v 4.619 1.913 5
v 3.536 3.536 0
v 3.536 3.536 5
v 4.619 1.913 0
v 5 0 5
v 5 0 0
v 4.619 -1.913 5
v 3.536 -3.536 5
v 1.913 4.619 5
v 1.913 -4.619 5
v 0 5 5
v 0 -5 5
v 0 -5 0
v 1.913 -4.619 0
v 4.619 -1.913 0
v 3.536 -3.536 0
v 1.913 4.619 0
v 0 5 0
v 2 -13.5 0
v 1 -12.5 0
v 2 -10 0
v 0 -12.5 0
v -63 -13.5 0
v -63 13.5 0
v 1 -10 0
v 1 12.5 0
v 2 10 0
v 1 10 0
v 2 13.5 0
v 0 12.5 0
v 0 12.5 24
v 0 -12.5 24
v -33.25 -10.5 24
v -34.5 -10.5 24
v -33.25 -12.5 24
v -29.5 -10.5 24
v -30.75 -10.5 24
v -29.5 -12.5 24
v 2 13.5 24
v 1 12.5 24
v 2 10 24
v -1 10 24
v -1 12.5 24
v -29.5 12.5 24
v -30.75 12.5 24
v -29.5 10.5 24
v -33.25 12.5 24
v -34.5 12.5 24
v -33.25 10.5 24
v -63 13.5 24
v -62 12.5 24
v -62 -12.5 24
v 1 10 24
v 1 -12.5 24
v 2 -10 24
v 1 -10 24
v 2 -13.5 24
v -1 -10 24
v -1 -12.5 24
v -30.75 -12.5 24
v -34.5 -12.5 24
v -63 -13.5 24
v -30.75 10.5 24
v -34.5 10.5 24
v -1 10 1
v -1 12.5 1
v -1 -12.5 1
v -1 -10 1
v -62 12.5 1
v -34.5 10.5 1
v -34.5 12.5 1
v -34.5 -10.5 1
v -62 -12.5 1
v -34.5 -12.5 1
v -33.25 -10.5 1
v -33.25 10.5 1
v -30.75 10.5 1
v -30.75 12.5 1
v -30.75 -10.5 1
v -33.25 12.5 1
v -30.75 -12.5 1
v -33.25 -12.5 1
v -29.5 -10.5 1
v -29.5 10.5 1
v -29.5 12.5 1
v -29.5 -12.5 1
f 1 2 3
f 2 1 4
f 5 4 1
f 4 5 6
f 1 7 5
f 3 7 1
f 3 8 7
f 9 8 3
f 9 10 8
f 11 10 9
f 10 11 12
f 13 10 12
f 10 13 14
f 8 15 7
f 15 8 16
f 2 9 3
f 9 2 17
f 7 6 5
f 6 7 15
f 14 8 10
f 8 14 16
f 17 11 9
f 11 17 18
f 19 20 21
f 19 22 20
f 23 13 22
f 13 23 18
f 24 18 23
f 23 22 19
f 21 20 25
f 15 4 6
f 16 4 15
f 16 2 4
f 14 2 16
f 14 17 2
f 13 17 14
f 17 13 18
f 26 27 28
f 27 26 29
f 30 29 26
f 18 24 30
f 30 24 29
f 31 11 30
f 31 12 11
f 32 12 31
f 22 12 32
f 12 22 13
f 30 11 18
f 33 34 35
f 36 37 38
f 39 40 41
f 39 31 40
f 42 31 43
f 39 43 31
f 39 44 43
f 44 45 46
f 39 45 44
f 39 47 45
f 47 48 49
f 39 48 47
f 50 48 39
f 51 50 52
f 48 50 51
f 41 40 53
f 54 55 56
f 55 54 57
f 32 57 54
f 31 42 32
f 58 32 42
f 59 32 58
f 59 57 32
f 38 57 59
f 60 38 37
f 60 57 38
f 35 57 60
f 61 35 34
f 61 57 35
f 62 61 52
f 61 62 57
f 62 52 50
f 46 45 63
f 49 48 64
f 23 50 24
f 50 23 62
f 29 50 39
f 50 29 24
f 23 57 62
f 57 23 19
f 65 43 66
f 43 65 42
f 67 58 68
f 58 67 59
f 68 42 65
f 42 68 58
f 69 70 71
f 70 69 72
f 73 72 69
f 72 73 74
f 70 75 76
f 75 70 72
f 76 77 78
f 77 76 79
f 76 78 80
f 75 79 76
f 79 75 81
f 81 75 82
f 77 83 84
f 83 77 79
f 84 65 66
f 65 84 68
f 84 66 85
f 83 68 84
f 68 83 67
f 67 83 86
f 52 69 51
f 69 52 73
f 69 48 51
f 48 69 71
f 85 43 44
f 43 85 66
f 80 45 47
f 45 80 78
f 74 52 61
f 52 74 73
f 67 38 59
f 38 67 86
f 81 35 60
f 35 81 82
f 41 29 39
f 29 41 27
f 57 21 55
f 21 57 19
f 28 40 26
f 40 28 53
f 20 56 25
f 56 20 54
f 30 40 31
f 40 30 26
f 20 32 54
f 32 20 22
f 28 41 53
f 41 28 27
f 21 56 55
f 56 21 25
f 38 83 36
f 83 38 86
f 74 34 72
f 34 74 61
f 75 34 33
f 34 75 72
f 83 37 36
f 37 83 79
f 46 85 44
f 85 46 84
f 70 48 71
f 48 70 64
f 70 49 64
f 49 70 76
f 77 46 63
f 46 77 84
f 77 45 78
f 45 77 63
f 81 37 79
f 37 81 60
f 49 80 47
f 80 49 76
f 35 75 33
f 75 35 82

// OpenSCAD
// [FL_INDEX: keywords="openscad, 3d_parametric, Customizable_Mini_Storage_Drawers_V1_7__Updated_23_07_2015, csg_solid" | COT="Parametric OpenSCAD design from 3DCodeverse"]
// Title: Customizable Mini Storage Drawers V1.7 *Updated 23/07/2015*

//Box type 
box_type = 1; //[0:Half Height, 1:Standard, 2:Double, 3:Quad]

//Rack depth (no more than your max Z height!)
depth = 64;

//With divider slots?
divider = 1; //[0:No, 1:Yes]

//Render drawer or divider panel?
panel = 0; // [0:Box, 1:Panel]




//finger pull
if (panel == 0) {
	difference() {
		cylinder(h=5, r=5);
		translate(v=[-5,0,0]) {
			cube(size=[10,10,10], center=true);
		}
	}
}


if (box_type == 0) {
	if (panel == 0) {
		translate(v=[-depth/2+0.5,0,11.5/2]) {
			difference() {
				cube(size=[depth-1,27,11.5], center=true);
				translate(v=[0,0,0.5]){
					cube(size=[depth-3,25,10.5], center=true);
				}
			}
		}
	translate(v=[0.5,0,5.75]) {
			difference() {
				cube(size=[3,27,11.5], center=true);
				cube(size=[1,25,11.5], center=true);
				cube(size=[3,20,11.5], center=true);
			}
		}
	}

	if (divider == 1) {
		if (panel == 0) {
			difference() {
				union() {
					translate(v=[-depth/2,-27/2+2,11.5/2]) {
						cube(size=[5,2,11.5], center = true);
					}
					translate(v=[-depth/2,27/2-2,11.5/2]) {
						cube(size=[5,2,11.5], center = true);
					}
				}
				translate(v=[-depth/2,0,11.5/2]) {
						cube(size=[2.5,25,11.5], center = true);
				}
			}
		}
		if (panel == 1) {
				cube(size=[24,10,2], center=true);
		}
	}
}






if (box_type == 1) {
	if (panel == 0) {
		translate(v=[-depth/2+0.5,0,24/2]) {
			difference() {
				cube(size=[depth-1,27,24], center=true);
				translate(v=[0,0,0.5]){
					cube(size=[depth-3,25,23], center=true);
				}
			}
		}
		translate(v=[0.5,0,12]) {
			difference() {
				cube(size=[3,27,24], center=true);
				cube(size=[1,25,24], center=true);
				cube(size=[3,20,24], center=true);
			}
		}
	}

	if (divider == 1) {
		if (panel == 0) {
			difference() {
				union() {
					translate(v=[-depth/2,-27/2+2,12]) {
						cube(size=[5,2,24], center = true);
					}
					translate(v=[-depth/2,27/2-2,12]) {
						cube(size=[5,2,24], center = true);
					}
				}
				translate(v=[-depth/2,0,12]) {
					cube(size=[2.5,25,24], center = true);
				}
			}
		}
		if (panel == 1) {
			cube(size=[24,23,2], center=true);
		}
	}
}







if (box_type == 2) {
	if (panel == 0) {
		translate(v=[-depth/2+0.5,0,24/2]) {
			difference() {
				cube(size=[depth-1,57,24], center=true);
				translate(v=[0,0,0.5]){
					cube(size=[depth-3,55,23], center=true);
				}
			}
		}
		translate(v=[0.5,0,12]) {
			difference() {
				cube(size=[3,57,24], center=true);
				cube(size=[1,55,24], center=true);
				cube(size=[3,50,24], center=true);
			}
		}
	}

	if (divider == 1) {
		if (panel == 0) {
			difference() {
				union() {
					translate(v=[-depth/2,-57/2+2,12]) {
						cube(size=[5,2,24], center = true);
					}
					translate(v=[-depth/2,57/2-2,12]) {
						cube(size=[5,2,24], center = true);
					}
				}
				translate(v=[-depth/2,0,12]) {
					cube(size=[2.5,55,24], center = true);
				}
			}
		}
		if (panel == 1) {
			cube(size=[24,54,2], center=true);
		}
	}
}





if (box_type == 3 ) {
	if (panel == 0) {
		translate(v=[-depth/2+0.5,0,24/2]) {
			difference() {
				cube(size=[depth-1,115,24], center=true);
				translate(v=[0,0,0.5]){
					cube(size=[depth-3,113,23], center=true);
				}
			}
		}
		translate(v=[0.5,0,12]) {
			difference() {
				cube(size=[3,57,24], center=true);
				cube(size=[1,55,24], center=true);
				cube(size=[3,50,24], center=true);
			}
		}
	}

	if (divider == 1) {
		if (panel == 0) {
			difference() {
				union() {
					translate(v=[-depth/2,-115/2+2,12]) {
						cube(size=[5,2,24], center = true);
					}
					translate(v=[-depth/2,115/2-2,12]) {
						cube(size=[5,2,24], center = true);
					}
				}
				translate(v=[-depth/2,0,12]) {
					cube(size=[2.5,113,24], center = true);
				}
			}
		}
		if (panel == 1) {
			cube(size=[24,112,2], center=true);
		}
	}
}
